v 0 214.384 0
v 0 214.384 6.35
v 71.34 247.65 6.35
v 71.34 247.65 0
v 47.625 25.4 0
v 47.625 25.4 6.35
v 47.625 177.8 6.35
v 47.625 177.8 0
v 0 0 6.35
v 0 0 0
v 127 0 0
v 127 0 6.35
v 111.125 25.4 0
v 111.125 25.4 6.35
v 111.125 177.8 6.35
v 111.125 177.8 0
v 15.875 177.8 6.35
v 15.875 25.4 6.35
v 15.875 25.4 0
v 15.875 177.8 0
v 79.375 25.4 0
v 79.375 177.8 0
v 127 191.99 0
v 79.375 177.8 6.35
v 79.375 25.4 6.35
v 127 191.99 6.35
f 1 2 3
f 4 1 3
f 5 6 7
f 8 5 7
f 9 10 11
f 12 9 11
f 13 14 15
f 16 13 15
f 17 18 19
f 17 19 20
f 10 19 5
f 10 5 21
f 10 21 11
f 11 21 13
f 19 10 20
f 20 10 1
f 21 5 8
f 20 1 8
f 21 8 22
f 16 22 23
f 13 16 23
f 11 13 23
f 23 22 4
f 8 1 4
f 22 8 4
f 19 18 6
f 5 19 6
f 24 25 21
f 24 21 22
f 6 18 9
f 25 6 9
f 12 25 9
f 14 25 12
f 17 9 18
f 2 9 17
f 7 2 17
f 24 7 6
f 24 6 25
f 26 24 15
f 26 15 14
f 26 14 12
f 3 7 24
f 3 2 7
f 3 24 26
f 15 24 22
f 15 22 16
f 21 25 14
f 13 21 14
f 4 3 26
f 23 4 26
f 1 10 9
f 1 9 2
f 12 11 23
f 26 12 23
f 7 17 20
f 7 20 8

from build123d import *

# Parameters (mm, degrees)
SKETCH1_W           = 127
SKETCH1_H           = 247.65
BOSS_EXTRUDE1_DEPTH = 6.35
CUT_EXTRUDE1_DEPTH  = 279.387939753
SKETCH3_W           = 31.75
SKETCH3_H           = 152.4
CUT_EXTRUDE2_DEPTH  = 279.387939753


with BuildPart() as part:
    # Sketch1 → Boss-Extrude1 (new body)
    with BuildSketch(Plane.XY):
        with Locations((63.5, 123.825)):
            Rectangle(SKETCH1_W, SKETCH1_H)
    extrude(amount=BOSS_EXTRUDE1_DEPTH)

    # Sketch2 → Cut-Extrude1 (cut, through all)
    with BuildSketch(Plane.XY.offset(6.35)):
        Polygon((0, 214.383772574), (71.339654933, 247.65), (0, 247.65), align=None)
        Polygon((127, 247.65), (71.339654933, 247.65), (127, 191.989654933), align=None)
    extrude(amount=-CUT_EXTRUDE1_DEPTH, mode=Mode.SUBTRACT)

    # Sketch3 → Cut-Extrude2 (cut, through all)
    with BuildSketch(Plane.XY.offset(6.35)):
        with Locations((31.75, 101.6)):
            Rectangle(SKETCH3_W, SKETCH3_H)
        with Locations((95.25, 101.6)):
            Rectangle(SKETCH3_W, SKETCH3_H)
    extrude(amount=-CUT_EXTRUDE2_DEPTH, mode=Mode.SUBTRACT)


solid = part.part
